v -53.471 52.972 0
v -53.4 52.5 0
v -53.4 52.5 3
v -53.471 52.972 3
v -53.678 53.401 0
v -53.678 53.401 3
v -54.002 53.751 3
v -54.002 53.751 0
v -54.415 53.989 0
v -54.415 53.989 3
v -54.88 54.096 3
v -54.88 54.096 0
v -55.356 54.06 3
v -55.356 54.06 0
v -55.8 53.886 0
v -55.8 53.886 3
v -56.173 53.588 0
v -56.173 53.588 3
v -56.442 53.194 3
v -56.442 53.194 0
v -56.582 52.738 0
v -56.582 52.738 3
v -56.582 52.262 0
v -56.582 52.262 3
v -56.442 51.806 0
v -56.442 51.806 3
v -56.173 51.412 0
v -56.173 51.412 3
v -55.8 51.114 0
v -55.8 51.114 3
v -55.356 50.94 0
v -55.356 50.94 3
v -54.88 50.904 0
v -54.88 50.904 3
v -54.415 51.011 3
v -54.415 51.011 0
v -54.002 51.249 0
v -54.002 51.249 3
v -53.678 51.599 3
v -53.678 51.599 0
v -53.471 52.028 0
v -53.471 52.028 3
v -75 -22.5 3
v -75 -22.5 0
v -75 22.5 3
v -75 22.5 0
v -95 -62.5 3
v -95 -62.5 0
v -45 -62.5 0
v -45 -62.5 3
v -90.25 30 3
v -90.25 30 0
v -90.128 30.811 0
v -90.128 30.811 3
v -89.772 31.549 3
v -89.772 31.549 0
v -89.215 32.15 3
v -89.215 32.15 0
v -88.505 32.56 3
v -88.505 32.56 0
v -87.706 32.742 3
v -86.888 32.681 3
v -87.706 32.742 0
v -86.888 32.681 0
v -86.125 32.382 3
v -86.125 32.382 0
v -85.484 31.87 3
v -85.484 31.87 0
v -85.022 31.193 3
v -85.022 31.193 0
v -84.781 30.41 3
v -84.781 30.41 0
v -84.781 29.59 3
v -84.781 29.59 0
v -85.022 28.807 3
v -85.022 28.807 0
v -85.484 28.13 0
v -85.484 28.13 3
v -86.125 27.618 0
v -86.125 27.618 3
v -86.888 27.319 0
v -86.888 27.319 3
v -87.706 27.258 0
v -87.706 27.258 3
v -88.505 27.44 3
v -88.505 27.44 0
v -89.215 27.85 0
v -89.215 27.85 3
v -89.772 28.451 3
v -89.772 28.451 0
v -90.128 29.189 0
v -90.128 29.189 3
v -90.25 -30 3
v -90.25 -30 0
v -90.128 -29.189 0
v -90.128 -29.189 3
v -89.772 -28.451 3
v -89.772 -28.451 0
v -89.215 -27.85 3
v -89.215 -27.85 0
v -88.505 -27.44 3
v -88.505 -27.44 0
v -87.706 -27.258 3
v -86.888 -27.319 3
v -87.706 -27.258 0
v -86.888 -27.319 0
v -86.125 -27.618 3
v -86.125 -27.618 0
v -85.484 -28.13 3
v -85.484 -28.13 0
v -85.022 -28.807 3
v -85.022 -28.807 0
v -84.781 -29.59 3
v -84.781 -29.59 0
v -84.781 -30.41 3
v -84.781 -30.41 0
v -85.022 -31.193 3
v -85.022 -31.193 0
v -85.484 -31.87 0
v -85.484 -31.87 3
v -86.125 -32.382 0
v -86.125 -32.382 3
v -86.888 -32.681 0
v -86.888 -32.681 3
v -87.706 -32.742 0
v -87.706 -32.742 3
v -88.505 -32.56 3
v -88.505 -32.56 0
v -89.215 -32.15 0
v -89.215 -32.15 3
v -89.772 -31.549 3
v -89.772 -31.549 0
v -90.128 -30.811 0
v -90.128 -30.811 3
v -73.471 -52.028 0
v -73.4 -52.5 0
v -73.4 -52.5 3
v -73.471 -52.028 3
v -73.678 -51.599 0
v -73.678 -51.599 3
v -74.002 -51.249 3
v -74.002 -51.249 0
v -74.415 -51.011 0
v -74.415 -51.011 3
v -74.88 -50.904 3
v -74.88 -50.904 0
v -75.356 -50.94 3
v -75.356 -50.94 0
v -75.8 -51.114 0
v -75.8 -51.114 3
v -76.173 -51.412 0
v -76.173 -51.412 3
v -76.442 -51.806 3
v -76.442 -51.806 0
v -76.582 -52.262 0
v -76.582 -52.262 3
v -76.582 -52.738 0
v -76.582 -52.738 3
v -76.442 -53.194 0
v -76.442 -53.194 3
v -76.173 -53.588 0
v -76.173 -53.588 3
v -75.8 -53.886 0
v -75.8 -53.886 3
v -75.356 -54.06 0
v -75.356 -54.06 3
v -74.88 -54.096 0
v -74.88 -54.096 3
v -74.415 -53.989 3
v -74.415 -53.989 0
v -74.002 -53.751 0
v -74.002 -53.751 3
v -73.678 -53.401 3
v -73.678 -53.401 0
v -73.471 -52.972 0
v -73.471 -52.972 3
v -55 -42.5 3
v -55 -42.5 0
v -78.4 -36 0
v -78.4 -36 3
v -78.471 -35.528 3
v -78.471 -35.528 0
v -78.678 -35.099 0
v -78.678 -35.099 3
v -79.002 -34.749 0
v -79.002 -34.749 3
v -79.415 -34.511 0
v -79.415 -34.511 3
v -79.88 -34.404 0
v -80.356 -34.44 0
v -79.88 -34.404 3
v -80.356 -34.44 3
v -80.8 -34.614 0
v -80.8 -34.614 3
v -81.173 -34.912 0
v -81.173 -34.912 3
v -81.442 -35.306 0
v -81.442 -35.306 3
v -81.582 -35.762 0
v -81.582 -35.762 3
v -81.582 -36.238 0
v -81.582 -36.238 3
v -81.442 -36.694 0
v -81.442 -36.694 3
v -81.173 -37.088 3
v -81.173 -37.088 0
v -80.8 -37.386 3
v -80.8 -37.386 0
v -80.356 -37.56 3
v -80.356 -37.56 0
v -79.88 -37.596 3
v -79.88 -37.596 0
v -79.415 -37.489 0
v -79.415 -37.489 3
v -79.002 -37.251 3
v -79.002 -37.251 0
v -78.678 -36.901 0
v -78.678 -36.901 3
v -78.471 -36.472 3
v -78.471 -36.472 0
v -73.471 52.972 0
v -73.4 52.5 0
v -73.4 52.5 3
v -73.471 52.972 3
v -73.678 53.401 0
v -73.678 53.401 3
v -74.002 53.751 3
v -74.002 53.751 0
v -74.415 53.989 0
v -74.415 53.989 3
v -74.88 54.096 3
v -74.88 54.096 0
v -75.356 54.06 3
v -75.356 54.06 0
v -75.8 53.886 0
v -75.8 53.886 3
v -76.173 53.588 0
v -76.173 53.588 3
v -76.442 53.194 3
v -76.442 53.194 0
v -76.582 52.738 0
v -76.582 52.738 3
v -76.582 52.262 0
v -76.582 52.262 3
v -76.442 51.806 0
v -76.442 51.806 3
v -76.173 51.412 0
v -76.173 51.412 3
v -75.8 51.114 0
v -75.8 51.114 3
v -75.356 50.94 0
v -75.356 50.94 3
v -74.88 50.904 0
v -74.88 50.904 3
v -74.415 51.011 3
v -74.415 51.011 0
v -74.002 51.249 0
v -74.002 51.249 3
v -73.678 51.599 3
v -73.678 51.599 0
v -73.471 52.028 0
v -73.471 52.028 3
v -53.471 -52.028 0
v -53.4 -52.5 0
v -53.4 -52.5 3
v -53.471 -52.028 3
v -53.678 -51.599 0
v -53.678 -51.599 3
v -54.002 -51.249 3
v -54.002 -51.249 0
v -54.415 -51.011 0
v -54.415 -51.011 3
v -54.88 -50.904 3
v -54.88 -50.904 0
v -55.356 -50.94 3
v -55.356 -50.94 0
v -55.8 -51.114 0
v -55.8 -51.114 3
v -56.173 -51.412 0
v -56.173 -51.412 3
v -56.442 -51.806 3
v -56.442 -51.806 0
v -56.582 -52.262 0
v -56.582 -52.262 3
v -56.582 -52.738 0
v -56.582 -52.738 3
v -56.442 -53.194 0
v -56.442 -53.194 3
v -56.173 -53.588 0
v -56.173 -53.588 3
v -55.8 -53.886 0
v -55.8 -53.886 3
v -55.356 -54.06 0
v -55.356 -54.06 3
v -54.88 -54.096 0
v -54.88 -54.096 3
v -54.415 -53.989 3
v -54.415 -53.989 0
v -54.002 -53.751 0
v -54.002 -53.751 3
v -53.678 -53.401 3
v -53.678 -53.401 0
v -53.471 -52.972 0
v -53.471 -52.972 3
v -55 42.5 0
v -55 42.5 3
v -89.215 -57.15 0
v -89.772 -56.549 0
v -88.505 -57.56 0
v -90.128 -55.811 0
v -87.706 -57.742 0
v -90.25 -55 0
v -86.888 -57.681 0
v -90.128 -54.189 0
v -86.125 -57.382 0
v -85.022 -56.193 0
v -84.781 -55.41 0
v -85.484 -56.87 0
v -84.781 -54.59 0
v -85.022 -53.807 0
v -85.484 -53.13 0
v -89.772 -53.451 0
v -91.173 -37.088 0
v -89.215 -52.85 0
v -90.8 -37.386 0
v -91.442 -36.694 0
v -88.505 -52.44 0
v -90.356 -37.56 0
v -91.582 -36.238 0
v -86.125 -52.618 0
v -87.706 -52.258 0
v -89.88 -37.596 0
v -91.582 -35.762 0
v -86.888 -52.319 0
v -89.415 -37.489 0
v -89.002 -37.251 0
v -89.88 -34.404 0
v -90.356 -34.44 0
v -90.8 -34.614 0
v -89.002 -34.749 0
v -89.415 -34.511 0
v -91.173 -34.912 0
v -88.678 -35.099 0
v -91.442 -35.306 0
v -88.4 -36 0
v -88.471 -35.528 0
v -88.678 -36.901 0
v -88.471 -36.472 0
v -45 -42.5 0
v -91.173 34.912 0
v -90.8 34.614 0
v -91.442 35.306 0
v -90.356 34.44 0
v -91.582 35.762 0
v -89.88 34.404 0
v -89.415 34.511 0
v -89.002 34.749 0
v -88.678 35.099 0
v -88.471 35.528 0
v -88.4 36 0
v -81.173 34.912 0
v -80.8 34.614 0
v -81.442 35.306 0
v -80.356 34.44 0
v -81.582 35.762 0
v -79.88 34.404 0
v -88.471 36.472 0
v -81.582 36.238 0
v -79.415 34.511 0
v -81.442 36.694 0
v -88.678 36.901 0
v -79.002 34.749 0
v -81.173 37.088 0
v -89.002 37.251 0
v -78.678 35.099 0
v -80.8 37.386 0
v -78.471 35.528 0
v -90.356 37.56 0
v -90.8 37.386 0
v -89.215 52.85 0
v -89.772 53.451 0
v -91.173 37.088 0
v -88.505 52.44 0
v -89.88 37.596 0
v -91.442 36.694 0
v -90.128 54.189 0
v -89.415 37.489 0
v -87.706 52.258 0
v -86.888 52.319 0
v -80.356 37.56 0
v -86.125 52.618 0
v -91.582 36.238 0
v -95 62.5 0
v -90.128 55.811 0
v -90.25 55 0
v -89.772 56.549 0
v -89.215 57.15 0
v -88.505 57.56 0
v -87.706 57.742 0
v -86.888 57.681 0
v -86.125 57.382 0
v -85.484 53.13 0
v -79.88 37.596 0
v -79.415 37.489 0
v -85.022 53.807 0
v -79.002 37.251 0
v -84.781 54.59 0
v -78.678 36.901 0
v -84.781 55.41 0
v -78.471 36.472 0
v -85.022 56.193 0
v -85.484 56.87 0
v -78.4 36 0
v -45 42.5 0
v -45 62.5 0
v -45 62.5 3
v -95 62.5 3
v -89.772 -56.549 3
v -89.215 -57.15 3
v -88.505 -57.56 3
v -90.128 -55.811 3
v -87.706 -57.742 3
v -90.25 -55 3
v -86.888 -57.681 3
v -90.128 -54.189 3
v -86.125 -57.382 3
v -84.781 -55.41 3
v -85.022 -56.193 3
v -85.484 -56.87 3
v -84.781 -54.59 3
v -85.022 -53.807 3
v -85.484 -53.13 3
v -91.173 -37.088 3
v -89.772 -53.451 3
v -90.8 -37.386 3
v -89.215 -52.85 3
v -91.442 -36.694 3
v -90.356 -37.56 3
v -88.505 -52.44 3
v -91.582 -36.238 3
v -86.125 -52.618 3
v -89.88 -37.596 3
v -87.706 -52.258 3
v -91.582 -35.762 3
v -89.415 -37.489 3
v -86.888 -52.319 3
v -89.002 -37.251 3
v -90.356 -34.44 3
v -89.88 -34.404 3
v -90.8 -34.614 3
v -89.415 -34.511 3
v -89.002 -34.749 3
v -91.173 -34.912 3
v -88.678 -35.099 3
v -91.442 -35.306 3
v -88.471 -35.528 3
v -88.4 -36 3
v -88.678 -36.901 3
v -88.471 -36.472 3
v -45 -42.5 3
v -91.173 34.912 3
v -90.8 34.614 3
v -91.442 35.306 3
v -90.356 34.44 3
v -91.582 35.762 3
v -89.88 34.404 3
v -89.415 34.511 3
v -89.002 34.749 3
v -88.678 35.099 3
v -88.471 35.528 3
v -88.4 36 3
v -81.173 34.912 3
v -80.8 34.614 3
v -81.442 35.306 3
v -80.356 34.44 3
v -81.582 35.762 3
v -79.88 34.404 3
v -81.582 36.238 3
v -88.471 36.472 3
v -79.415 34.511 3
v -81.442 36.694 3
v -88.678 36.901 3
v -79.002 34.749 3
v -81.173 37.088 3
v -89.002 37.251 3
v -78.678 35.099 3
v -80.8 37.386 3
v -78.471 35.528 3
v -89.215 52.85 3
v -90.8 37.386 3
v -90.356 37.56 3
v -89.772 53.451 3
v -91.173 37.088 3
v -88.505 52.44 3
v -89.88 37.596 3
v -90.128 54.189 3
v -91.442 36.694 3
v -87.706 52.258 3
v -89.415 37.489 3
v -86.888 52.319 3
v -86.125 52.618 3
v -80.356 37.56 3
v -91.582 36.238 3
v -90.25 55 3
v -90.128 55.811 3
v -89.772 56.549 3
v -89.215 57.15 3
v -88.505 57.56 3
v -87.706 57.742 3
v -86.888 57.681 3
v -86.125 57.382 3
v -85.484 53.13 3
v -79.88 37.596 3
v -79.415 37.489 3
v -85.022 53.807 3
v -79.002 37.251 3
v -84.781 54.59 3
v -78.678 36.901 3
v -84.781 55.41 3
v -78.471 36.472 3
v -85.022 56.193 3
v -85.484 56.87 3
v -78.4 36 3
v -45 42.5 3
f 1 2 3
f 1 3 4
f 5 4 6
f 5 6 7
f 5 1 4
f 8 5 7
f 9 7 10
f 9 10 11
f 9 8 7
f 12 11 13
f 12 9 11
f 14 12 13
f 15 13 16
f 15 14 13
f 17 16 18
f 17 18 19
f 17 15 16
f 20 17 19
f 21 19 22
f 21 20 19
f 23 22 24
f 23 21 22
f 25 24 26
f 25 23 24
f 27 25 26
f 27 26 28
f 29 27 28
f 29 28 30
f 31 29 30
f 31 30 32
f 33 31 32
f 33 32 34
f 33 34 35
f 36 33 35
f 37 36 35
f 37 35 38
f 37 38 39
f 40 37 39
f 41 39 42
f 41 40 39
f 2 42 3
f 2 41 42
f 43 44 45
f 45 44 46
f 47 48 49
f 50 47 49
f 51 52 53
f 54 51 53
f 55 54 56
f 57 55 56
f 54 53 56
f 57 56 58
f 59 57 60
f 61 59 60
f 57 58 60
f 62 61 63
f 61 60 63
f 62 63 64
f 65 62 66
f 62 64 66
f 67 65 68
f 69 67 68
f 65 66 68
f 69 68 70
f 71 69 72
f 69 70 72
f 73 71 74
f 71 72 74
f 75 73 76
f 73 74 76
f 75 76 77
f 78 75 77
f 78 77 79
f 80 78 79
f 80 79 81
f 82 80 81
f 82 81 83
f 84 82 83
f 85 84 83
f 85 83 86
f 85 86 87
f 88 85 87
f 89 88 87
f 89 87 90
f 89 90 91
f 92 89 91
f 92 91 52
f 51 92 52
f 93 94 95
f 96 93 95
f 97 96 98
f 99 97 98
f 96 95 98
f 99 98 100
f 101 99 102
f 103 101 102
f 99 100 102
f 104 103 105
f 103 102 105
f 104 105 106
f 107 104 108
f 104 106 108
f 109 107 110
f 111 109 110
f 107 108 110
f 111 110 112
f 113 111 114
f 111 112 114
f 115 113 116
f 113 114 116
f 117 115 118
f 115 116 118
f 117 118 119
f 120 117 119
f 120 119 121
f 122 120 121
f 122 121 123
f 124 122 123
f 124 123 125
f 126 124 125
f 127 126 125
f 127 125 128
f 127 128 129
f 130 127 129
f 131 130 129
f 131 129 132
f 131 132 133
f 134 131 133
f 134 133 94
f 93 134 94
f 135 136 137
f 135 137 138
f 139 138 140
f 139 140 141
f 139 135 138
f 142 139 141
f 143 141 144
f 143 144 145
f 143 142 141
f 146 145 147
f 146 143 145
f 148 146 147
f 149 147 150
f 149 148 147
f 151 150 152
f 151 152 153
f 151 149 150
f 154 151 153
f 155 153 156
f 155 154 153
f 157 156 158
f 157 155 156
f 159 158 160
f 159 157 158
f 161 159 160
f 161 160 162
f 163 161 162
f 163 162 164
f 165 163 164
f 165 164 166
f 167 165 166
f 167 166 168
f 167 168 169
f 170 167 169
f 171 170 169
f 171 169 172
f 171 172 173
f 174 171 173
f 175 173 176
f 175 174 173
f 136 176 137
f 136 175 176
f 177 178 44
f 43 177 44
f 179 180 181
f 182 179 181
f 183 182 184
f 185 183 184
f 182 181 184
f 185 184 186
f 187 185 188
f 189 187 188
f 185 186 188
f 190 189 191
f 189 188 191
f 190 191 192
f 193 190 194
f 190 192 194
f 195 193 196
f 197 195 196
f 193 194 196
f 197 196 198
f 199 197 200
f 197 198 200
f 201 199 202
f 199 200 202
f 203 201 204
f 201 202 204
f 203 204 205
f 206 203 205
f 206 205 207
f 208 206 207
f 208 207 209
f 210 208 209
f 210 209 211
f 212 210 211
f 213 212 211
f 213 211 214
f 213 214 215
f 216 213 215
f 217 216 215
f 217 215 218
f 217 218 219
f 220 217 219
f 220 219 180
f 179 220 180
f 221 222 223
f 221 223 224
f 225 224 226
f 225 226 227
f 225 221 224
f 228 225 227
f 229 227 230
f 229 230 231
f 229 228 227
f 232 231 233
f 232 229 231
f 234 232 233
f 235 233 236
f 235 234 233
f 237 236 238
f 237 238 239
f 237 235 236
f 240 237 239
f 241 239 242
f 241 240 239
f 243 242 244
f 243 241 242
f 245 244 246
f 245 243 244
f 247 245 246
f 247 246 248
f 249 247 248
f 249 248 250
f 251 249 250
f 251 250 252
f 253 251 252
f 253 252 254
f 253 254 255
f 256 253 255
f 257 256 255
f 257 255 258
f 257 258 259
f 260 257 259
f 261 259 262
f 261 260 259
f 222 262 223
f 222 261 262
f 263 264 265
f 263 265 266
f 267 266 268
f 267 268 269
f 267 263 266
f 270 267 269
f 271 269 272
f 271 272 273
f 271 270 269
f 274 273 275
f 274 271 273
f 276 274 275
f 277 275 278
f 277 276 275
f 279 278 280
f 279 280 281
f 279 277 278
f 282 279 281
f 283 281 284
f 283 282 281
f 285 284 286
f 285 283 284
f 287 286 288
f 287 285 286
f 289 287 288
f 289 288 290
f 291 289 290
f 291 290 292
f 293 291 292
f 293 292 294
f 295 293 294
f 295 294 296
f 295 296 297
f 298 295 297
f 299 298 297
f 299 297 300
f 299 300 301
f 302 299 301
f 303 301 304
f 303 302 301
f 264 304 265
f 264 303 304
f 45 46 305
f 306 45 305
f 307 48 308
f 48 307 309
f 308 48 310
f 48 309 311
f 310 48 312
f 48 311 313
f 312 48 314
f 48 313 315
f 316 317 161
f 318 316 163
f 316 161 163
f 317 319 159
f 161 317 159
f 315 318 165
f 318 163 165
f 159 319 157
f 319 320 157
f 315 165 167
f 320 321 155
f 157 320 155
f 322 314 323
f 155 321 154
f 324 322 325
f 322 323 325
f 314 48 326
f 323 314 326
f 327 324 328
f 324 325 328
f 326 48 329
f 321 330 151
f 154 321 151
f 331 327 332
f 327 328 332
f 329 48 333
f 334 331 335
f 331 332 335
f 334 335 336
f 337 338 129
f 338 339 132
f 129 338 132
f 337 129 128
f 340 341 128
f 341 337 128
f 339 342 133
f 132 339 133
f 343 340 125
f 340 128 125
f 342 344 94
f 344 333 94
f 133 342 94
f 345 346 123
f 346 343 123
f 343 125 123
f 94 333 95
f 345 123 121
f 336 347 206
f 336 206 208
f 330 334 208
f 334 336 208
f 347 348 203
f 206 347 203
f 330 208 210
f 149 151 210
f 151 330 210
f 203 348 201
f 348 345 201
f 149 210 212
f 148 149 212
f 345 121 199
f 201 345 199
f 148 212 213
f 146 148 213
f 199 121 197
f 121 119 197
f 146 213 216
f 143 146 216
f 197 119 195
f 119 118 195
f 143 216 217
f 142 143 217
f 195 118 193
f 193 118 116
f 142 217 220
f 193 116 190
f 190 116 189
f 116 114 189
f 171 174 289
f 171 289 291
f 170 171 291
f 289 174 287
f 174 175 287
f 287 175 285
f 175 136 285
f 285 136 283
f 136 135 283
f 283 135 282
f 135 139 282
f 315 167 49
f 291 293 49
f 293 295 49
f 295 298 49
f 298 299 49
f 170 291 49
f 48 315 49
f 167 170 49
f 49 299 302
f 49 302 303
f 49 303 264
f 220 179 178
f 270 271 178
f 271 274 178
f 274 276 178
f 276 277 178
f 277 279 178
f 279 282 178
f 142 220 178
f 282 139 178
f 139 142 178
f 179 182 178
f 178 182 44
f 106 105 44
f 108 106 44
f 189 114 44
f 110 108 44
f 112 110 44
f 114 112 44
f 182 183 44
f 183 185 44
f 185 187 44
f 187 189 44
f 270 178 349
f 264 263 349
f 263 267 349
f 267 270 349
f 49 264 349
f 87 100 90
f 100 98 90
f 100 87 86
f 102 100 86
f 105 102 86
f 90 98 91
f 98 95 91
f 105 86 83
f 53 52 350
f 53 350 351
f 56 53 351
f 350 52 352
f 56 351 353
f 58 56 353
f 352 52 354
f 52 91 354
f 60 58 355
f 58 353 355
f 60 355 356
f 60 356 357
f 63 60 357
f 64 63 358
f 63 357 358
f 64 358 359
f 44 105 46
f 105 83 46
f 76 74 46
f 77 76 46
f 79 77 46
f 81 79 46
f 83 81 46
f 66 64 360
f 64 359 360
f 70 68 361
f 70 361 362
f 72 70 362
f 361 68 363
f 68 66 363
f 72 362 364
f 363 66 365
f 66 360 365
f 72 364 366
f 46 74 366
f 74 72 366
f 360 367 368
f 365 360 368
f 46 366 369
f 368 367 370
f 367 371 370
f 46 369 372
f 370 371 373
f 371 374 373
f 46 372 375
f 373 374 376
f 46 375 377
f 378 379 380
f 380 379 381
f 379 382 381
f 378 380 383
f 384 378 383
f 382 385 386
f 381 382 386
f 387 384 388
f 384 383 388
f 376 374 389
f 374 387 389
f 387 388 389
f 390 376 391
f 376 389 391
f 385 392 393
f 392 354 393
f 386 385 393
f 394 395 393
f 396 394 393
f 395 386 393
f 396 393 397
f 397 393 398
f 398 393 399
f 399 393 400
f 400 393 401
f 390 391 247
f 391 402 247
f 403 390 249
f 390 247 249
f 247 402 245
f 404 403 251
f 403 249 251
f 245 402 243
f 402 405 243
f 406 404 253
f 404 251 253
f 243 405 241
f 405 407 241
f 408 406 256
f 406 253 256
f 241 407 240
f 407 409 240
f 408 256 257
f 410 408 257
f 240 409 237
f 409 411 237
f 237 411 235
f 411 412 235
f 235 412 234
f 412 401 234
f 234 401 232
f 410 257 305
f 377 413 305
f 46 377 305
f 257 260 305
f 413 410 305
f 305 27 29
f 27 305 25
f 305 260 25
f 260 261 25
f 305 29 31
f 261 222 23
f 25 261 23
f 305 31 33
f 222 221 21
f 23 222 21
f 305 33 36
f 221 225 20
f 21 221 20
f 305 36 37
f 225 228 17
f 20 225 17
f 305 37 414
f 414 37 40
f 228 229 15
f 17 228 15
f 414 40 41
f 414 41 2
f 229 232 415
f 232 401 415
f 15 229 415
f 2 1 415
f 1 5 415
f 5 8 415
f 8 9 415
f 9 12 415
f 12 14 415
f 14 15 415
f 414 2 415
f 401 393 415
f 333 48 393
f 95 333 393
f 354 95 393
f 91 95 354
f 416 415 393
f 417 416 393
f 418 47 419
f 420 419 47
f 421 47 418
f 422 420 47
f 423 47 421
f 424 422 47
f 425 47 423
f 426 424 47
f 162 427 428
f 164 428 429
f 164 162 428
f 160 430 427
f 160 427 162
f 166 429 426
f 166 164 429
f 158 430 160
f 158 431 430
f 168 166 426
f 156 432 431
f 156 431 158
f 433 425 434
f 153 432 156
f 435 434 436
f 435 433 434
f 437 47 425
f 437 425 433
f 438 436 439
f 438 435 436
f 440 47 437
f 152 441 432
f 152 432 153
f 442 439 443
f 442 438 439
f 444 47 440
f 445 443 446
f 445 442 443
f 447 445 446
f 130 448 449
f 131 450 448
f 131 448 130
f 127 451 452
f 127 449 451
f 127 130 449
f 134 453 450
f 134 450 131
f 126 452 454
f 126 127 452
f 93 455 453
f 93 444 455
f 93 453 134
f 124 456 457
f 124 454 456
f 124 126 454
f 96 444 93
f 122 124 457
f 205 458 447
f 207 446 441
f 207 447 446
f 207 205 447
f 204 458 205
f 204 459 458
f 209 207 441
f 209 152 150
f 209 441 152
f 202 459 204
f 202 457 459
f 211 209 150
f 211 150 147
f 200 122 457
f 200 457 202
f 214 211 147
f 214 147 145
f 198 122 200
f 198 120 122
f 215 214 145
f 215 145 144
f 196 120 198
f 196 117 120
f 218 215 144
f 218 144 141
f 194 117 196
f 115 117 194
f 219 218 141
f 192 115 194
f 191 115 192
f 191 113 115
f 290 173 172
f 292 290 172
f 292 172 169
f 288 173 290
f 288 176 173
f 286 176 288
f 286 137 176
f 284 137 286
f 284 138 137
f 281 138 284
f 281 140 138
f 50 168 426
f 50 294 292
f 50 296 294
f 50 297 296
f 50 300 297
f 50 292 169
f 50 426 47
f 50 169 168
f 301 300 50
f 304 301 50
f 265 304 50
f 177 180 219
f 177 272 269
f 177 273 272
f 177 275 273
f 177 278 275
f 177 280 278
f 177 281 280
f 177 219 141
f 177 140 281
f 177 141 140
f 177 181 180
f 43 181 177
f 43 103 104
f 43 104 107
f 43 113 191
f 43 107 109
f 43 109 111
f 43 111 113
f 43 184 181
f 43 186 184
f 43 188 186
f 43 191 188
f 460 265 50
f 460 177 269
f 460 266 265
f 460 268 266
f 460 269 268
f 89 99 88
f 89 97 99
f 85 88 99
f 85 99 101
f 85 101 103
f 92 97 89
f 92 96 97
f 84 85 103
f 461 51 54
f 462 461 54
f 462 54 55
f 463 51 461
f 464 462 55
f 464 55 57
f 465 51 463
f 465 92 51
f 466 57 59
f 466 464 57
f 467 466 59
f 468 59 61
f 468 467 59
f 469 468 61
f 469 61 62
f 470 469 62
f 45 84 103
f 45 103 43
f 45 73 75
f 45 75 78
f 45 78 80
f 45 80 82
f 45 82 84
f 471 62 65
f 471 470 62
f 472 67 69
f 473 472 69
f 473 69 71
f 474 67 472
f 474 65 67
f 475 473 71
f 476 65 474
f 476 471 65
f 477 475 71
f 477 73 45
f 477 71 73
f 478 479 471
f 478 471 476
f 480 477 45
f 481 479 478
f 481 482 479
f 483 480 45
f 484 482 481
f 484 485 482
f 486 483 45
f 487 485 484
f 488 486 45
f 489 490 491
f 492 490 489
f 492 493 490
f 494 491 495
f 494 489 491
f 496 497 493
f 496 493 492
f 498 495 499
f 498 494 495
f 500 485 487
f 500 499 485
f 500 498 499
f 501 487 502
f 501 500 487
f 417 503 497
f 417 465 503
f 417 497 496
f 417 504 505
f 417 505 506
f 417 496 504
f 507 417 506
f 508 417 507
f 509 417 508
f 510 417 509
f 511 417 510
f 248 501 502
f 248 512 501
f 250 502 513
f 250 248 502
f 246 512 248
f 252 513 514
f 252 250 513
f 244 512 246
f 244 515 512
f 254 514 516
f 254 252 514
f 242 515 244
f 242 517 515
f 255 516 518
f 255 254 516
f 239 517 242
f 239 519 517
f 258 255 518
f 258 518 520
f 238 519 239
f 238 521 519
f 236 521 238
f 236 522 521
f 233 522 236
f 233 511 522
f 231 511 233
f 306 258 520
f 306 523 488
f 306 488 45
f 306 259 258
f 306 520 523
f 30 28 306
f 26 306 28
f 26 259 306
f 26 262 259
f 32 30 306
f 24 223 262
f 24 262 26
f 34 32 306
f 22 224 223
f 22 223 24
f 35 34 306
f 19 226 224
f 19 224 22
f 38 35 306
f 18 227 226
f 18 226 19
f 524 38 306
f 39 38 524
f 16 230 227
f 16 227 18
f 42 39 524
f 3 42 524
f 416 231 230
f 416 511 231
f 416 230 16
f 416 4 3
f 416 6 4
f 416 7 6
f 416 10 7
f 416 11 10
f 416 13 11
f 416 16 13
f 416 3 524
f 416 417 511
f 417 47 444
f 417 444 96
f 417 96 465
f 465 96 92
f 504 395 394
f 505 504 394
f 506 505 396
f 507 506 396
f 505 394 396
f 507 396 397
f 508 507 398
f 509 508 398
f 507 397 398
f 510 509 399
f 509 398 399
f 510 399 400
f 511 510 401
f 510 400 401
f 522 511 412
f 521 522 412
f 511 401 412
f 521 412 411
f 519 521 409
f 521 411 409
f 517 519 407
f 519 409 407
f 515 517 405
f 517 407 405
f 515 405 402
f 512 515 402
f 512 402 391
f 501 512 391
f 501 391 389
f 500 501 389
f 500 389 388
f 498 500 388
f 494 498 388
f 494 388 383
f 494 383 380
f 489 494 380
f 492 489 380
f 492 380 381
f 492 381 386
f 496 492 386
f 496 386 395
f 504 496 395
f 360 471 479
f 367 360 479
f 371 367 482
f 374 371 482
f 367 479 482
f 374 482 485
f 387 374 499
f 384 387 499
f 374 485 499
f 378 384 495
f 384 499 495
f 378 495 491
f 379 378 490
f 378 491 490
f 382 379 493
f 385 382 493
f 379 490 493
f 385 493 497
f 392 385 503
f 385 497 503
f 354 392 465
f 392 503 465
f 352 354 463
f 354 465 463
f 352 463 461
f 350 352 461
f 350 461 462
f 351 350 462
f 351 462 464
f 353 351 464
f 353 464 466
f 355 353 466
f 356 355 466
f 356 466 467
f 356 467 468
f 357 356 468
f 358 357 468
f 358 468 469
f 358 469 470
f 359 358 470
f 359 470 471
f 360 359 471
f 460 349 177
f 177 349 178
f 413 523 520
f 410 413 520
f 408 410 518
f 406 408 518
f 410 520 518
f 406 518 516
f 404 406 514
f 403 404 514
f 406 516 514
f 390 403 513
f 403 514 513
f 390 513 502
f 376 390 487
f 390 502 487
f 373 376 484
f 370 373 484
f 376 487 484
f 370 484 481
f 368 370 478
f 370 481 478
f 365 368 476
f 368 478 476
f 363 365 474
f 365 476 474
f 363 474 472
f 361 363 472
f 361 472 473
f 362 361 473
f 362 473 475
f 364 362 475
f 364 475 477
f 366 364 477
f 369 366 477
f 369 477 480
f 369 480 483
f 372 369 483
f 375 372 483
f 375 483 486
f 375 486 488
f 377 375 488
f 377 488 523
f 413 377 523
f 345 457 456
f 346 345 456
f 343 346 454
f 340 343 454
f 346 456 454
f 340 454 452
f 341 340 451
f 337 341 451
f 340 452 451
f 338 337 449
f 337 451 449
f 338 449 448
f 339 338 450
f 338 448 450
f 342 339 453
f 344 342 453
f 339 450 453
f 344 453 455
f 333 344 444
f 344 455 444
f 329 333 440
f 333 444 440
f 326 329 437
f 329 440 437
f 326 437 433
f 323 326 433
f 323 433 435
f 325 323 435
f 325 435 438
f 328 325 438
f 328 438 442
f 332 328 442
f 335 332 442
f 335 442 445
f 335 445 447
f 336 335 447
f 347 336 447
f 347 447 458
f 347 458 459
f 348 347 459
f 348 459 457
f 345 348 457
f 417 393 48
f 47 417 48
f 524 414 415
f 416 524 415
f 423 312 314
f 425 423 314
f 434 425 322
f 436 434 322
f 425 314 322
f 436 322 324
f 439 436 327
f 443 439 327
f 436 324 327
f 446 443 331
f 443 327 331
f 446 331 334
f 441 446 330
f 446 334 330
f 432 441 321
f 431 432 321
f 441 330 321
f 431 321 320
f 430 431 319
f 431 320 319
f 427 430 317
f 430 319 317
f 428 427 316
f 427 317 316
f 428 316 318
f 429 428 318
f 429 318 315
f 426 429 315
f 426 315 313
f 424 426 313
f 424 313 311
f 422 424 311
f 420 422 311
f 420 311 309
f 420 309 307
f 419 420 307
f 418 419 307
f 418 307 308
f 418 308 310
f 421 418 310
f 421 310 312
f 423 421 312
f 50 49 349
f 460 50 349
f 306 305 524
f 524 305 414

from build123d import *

# Parameters (mm, degrees)
SKETCH1_R          = 1.6
EXTRUDE1_DEPTH     = 3
SKETCH2_R          = 1.6
CUT_EXTRUDE1_DEPTH = 26
SKETCH3_R          = 2.75
CUT_EXTRUDE2_DEPTH = 10


with BuildPart() as part:
    # Sketch1 → Extrude1 (new body)
    with BuildSketch(Plane.XY):
        Polygon((-95, 62.5), (-95, -62.5), (-55, -62.5), (-45, -62.5), (-45, -42.5), (-55, -42.5), (-75, -22.5), (-75, 22.5), (-55, 42.5), (-45, 42.5), (-45, 62.5), (-55, 62.5), align=None)
        with Locations((-55, -52.5)):
            Circle(SKETCH1_R, mode=Mode.SUBTRACT)
        with Locations((-75, -52.5)):
            Circle(SKETCH1_R, mode=Mode.SUBTRACT)
        with Locations((-55, 52.5)):
            Circle(SKETCH1_R, mode=Mode.SUBTRACT)
        with Locations((-75, 52.5)):
            Circle(SKETCH1_R, mode=Mode.SUBTRACT)
    extrude(amount=EXTRUDE1_DEPTH)

    # Sketch2 → Cut-Extrude1 (cut)
    with BuildSketch(Plane.XY.offset(3)):
        with Locations((-80, 36)):
            Circle(SKETCH2_R)
        with Locations((-90, 36)):
            Circle(SKETCH2_R)
        with Locations((-80, -36)):
            Circle(SKETCH2_R)
        with Locations((-90, -36)):
            Circle(SKETCH2_R)
    extrude(amount=-CUT_EXTRUDE1_DEPTH, mode=Mode.SUBTRACT)

    # Sketch3 → Cut-Extrude2 (cut)
    with BuildSketch(Plane(origin=(0, 0, 0), x_dir=(-1, 0, 0), z_dir=(0, 0, -1))):
        with Locations((87.5, 55)):
            Circle(SKETCH3_R)
        with Locations((87.5, 30)):
            Circle(SKETCH3_R)
        with Locations((87.5, -30)):
            Circle(SKETCH3_R)
        with Locations((87.5, -55)):
            Circle(SKETCH3_R)
    extrude(amount=-CUT_EXTRUDE2_DEPTH, mode=Mode.SUBTRACT)


solid = part.part
